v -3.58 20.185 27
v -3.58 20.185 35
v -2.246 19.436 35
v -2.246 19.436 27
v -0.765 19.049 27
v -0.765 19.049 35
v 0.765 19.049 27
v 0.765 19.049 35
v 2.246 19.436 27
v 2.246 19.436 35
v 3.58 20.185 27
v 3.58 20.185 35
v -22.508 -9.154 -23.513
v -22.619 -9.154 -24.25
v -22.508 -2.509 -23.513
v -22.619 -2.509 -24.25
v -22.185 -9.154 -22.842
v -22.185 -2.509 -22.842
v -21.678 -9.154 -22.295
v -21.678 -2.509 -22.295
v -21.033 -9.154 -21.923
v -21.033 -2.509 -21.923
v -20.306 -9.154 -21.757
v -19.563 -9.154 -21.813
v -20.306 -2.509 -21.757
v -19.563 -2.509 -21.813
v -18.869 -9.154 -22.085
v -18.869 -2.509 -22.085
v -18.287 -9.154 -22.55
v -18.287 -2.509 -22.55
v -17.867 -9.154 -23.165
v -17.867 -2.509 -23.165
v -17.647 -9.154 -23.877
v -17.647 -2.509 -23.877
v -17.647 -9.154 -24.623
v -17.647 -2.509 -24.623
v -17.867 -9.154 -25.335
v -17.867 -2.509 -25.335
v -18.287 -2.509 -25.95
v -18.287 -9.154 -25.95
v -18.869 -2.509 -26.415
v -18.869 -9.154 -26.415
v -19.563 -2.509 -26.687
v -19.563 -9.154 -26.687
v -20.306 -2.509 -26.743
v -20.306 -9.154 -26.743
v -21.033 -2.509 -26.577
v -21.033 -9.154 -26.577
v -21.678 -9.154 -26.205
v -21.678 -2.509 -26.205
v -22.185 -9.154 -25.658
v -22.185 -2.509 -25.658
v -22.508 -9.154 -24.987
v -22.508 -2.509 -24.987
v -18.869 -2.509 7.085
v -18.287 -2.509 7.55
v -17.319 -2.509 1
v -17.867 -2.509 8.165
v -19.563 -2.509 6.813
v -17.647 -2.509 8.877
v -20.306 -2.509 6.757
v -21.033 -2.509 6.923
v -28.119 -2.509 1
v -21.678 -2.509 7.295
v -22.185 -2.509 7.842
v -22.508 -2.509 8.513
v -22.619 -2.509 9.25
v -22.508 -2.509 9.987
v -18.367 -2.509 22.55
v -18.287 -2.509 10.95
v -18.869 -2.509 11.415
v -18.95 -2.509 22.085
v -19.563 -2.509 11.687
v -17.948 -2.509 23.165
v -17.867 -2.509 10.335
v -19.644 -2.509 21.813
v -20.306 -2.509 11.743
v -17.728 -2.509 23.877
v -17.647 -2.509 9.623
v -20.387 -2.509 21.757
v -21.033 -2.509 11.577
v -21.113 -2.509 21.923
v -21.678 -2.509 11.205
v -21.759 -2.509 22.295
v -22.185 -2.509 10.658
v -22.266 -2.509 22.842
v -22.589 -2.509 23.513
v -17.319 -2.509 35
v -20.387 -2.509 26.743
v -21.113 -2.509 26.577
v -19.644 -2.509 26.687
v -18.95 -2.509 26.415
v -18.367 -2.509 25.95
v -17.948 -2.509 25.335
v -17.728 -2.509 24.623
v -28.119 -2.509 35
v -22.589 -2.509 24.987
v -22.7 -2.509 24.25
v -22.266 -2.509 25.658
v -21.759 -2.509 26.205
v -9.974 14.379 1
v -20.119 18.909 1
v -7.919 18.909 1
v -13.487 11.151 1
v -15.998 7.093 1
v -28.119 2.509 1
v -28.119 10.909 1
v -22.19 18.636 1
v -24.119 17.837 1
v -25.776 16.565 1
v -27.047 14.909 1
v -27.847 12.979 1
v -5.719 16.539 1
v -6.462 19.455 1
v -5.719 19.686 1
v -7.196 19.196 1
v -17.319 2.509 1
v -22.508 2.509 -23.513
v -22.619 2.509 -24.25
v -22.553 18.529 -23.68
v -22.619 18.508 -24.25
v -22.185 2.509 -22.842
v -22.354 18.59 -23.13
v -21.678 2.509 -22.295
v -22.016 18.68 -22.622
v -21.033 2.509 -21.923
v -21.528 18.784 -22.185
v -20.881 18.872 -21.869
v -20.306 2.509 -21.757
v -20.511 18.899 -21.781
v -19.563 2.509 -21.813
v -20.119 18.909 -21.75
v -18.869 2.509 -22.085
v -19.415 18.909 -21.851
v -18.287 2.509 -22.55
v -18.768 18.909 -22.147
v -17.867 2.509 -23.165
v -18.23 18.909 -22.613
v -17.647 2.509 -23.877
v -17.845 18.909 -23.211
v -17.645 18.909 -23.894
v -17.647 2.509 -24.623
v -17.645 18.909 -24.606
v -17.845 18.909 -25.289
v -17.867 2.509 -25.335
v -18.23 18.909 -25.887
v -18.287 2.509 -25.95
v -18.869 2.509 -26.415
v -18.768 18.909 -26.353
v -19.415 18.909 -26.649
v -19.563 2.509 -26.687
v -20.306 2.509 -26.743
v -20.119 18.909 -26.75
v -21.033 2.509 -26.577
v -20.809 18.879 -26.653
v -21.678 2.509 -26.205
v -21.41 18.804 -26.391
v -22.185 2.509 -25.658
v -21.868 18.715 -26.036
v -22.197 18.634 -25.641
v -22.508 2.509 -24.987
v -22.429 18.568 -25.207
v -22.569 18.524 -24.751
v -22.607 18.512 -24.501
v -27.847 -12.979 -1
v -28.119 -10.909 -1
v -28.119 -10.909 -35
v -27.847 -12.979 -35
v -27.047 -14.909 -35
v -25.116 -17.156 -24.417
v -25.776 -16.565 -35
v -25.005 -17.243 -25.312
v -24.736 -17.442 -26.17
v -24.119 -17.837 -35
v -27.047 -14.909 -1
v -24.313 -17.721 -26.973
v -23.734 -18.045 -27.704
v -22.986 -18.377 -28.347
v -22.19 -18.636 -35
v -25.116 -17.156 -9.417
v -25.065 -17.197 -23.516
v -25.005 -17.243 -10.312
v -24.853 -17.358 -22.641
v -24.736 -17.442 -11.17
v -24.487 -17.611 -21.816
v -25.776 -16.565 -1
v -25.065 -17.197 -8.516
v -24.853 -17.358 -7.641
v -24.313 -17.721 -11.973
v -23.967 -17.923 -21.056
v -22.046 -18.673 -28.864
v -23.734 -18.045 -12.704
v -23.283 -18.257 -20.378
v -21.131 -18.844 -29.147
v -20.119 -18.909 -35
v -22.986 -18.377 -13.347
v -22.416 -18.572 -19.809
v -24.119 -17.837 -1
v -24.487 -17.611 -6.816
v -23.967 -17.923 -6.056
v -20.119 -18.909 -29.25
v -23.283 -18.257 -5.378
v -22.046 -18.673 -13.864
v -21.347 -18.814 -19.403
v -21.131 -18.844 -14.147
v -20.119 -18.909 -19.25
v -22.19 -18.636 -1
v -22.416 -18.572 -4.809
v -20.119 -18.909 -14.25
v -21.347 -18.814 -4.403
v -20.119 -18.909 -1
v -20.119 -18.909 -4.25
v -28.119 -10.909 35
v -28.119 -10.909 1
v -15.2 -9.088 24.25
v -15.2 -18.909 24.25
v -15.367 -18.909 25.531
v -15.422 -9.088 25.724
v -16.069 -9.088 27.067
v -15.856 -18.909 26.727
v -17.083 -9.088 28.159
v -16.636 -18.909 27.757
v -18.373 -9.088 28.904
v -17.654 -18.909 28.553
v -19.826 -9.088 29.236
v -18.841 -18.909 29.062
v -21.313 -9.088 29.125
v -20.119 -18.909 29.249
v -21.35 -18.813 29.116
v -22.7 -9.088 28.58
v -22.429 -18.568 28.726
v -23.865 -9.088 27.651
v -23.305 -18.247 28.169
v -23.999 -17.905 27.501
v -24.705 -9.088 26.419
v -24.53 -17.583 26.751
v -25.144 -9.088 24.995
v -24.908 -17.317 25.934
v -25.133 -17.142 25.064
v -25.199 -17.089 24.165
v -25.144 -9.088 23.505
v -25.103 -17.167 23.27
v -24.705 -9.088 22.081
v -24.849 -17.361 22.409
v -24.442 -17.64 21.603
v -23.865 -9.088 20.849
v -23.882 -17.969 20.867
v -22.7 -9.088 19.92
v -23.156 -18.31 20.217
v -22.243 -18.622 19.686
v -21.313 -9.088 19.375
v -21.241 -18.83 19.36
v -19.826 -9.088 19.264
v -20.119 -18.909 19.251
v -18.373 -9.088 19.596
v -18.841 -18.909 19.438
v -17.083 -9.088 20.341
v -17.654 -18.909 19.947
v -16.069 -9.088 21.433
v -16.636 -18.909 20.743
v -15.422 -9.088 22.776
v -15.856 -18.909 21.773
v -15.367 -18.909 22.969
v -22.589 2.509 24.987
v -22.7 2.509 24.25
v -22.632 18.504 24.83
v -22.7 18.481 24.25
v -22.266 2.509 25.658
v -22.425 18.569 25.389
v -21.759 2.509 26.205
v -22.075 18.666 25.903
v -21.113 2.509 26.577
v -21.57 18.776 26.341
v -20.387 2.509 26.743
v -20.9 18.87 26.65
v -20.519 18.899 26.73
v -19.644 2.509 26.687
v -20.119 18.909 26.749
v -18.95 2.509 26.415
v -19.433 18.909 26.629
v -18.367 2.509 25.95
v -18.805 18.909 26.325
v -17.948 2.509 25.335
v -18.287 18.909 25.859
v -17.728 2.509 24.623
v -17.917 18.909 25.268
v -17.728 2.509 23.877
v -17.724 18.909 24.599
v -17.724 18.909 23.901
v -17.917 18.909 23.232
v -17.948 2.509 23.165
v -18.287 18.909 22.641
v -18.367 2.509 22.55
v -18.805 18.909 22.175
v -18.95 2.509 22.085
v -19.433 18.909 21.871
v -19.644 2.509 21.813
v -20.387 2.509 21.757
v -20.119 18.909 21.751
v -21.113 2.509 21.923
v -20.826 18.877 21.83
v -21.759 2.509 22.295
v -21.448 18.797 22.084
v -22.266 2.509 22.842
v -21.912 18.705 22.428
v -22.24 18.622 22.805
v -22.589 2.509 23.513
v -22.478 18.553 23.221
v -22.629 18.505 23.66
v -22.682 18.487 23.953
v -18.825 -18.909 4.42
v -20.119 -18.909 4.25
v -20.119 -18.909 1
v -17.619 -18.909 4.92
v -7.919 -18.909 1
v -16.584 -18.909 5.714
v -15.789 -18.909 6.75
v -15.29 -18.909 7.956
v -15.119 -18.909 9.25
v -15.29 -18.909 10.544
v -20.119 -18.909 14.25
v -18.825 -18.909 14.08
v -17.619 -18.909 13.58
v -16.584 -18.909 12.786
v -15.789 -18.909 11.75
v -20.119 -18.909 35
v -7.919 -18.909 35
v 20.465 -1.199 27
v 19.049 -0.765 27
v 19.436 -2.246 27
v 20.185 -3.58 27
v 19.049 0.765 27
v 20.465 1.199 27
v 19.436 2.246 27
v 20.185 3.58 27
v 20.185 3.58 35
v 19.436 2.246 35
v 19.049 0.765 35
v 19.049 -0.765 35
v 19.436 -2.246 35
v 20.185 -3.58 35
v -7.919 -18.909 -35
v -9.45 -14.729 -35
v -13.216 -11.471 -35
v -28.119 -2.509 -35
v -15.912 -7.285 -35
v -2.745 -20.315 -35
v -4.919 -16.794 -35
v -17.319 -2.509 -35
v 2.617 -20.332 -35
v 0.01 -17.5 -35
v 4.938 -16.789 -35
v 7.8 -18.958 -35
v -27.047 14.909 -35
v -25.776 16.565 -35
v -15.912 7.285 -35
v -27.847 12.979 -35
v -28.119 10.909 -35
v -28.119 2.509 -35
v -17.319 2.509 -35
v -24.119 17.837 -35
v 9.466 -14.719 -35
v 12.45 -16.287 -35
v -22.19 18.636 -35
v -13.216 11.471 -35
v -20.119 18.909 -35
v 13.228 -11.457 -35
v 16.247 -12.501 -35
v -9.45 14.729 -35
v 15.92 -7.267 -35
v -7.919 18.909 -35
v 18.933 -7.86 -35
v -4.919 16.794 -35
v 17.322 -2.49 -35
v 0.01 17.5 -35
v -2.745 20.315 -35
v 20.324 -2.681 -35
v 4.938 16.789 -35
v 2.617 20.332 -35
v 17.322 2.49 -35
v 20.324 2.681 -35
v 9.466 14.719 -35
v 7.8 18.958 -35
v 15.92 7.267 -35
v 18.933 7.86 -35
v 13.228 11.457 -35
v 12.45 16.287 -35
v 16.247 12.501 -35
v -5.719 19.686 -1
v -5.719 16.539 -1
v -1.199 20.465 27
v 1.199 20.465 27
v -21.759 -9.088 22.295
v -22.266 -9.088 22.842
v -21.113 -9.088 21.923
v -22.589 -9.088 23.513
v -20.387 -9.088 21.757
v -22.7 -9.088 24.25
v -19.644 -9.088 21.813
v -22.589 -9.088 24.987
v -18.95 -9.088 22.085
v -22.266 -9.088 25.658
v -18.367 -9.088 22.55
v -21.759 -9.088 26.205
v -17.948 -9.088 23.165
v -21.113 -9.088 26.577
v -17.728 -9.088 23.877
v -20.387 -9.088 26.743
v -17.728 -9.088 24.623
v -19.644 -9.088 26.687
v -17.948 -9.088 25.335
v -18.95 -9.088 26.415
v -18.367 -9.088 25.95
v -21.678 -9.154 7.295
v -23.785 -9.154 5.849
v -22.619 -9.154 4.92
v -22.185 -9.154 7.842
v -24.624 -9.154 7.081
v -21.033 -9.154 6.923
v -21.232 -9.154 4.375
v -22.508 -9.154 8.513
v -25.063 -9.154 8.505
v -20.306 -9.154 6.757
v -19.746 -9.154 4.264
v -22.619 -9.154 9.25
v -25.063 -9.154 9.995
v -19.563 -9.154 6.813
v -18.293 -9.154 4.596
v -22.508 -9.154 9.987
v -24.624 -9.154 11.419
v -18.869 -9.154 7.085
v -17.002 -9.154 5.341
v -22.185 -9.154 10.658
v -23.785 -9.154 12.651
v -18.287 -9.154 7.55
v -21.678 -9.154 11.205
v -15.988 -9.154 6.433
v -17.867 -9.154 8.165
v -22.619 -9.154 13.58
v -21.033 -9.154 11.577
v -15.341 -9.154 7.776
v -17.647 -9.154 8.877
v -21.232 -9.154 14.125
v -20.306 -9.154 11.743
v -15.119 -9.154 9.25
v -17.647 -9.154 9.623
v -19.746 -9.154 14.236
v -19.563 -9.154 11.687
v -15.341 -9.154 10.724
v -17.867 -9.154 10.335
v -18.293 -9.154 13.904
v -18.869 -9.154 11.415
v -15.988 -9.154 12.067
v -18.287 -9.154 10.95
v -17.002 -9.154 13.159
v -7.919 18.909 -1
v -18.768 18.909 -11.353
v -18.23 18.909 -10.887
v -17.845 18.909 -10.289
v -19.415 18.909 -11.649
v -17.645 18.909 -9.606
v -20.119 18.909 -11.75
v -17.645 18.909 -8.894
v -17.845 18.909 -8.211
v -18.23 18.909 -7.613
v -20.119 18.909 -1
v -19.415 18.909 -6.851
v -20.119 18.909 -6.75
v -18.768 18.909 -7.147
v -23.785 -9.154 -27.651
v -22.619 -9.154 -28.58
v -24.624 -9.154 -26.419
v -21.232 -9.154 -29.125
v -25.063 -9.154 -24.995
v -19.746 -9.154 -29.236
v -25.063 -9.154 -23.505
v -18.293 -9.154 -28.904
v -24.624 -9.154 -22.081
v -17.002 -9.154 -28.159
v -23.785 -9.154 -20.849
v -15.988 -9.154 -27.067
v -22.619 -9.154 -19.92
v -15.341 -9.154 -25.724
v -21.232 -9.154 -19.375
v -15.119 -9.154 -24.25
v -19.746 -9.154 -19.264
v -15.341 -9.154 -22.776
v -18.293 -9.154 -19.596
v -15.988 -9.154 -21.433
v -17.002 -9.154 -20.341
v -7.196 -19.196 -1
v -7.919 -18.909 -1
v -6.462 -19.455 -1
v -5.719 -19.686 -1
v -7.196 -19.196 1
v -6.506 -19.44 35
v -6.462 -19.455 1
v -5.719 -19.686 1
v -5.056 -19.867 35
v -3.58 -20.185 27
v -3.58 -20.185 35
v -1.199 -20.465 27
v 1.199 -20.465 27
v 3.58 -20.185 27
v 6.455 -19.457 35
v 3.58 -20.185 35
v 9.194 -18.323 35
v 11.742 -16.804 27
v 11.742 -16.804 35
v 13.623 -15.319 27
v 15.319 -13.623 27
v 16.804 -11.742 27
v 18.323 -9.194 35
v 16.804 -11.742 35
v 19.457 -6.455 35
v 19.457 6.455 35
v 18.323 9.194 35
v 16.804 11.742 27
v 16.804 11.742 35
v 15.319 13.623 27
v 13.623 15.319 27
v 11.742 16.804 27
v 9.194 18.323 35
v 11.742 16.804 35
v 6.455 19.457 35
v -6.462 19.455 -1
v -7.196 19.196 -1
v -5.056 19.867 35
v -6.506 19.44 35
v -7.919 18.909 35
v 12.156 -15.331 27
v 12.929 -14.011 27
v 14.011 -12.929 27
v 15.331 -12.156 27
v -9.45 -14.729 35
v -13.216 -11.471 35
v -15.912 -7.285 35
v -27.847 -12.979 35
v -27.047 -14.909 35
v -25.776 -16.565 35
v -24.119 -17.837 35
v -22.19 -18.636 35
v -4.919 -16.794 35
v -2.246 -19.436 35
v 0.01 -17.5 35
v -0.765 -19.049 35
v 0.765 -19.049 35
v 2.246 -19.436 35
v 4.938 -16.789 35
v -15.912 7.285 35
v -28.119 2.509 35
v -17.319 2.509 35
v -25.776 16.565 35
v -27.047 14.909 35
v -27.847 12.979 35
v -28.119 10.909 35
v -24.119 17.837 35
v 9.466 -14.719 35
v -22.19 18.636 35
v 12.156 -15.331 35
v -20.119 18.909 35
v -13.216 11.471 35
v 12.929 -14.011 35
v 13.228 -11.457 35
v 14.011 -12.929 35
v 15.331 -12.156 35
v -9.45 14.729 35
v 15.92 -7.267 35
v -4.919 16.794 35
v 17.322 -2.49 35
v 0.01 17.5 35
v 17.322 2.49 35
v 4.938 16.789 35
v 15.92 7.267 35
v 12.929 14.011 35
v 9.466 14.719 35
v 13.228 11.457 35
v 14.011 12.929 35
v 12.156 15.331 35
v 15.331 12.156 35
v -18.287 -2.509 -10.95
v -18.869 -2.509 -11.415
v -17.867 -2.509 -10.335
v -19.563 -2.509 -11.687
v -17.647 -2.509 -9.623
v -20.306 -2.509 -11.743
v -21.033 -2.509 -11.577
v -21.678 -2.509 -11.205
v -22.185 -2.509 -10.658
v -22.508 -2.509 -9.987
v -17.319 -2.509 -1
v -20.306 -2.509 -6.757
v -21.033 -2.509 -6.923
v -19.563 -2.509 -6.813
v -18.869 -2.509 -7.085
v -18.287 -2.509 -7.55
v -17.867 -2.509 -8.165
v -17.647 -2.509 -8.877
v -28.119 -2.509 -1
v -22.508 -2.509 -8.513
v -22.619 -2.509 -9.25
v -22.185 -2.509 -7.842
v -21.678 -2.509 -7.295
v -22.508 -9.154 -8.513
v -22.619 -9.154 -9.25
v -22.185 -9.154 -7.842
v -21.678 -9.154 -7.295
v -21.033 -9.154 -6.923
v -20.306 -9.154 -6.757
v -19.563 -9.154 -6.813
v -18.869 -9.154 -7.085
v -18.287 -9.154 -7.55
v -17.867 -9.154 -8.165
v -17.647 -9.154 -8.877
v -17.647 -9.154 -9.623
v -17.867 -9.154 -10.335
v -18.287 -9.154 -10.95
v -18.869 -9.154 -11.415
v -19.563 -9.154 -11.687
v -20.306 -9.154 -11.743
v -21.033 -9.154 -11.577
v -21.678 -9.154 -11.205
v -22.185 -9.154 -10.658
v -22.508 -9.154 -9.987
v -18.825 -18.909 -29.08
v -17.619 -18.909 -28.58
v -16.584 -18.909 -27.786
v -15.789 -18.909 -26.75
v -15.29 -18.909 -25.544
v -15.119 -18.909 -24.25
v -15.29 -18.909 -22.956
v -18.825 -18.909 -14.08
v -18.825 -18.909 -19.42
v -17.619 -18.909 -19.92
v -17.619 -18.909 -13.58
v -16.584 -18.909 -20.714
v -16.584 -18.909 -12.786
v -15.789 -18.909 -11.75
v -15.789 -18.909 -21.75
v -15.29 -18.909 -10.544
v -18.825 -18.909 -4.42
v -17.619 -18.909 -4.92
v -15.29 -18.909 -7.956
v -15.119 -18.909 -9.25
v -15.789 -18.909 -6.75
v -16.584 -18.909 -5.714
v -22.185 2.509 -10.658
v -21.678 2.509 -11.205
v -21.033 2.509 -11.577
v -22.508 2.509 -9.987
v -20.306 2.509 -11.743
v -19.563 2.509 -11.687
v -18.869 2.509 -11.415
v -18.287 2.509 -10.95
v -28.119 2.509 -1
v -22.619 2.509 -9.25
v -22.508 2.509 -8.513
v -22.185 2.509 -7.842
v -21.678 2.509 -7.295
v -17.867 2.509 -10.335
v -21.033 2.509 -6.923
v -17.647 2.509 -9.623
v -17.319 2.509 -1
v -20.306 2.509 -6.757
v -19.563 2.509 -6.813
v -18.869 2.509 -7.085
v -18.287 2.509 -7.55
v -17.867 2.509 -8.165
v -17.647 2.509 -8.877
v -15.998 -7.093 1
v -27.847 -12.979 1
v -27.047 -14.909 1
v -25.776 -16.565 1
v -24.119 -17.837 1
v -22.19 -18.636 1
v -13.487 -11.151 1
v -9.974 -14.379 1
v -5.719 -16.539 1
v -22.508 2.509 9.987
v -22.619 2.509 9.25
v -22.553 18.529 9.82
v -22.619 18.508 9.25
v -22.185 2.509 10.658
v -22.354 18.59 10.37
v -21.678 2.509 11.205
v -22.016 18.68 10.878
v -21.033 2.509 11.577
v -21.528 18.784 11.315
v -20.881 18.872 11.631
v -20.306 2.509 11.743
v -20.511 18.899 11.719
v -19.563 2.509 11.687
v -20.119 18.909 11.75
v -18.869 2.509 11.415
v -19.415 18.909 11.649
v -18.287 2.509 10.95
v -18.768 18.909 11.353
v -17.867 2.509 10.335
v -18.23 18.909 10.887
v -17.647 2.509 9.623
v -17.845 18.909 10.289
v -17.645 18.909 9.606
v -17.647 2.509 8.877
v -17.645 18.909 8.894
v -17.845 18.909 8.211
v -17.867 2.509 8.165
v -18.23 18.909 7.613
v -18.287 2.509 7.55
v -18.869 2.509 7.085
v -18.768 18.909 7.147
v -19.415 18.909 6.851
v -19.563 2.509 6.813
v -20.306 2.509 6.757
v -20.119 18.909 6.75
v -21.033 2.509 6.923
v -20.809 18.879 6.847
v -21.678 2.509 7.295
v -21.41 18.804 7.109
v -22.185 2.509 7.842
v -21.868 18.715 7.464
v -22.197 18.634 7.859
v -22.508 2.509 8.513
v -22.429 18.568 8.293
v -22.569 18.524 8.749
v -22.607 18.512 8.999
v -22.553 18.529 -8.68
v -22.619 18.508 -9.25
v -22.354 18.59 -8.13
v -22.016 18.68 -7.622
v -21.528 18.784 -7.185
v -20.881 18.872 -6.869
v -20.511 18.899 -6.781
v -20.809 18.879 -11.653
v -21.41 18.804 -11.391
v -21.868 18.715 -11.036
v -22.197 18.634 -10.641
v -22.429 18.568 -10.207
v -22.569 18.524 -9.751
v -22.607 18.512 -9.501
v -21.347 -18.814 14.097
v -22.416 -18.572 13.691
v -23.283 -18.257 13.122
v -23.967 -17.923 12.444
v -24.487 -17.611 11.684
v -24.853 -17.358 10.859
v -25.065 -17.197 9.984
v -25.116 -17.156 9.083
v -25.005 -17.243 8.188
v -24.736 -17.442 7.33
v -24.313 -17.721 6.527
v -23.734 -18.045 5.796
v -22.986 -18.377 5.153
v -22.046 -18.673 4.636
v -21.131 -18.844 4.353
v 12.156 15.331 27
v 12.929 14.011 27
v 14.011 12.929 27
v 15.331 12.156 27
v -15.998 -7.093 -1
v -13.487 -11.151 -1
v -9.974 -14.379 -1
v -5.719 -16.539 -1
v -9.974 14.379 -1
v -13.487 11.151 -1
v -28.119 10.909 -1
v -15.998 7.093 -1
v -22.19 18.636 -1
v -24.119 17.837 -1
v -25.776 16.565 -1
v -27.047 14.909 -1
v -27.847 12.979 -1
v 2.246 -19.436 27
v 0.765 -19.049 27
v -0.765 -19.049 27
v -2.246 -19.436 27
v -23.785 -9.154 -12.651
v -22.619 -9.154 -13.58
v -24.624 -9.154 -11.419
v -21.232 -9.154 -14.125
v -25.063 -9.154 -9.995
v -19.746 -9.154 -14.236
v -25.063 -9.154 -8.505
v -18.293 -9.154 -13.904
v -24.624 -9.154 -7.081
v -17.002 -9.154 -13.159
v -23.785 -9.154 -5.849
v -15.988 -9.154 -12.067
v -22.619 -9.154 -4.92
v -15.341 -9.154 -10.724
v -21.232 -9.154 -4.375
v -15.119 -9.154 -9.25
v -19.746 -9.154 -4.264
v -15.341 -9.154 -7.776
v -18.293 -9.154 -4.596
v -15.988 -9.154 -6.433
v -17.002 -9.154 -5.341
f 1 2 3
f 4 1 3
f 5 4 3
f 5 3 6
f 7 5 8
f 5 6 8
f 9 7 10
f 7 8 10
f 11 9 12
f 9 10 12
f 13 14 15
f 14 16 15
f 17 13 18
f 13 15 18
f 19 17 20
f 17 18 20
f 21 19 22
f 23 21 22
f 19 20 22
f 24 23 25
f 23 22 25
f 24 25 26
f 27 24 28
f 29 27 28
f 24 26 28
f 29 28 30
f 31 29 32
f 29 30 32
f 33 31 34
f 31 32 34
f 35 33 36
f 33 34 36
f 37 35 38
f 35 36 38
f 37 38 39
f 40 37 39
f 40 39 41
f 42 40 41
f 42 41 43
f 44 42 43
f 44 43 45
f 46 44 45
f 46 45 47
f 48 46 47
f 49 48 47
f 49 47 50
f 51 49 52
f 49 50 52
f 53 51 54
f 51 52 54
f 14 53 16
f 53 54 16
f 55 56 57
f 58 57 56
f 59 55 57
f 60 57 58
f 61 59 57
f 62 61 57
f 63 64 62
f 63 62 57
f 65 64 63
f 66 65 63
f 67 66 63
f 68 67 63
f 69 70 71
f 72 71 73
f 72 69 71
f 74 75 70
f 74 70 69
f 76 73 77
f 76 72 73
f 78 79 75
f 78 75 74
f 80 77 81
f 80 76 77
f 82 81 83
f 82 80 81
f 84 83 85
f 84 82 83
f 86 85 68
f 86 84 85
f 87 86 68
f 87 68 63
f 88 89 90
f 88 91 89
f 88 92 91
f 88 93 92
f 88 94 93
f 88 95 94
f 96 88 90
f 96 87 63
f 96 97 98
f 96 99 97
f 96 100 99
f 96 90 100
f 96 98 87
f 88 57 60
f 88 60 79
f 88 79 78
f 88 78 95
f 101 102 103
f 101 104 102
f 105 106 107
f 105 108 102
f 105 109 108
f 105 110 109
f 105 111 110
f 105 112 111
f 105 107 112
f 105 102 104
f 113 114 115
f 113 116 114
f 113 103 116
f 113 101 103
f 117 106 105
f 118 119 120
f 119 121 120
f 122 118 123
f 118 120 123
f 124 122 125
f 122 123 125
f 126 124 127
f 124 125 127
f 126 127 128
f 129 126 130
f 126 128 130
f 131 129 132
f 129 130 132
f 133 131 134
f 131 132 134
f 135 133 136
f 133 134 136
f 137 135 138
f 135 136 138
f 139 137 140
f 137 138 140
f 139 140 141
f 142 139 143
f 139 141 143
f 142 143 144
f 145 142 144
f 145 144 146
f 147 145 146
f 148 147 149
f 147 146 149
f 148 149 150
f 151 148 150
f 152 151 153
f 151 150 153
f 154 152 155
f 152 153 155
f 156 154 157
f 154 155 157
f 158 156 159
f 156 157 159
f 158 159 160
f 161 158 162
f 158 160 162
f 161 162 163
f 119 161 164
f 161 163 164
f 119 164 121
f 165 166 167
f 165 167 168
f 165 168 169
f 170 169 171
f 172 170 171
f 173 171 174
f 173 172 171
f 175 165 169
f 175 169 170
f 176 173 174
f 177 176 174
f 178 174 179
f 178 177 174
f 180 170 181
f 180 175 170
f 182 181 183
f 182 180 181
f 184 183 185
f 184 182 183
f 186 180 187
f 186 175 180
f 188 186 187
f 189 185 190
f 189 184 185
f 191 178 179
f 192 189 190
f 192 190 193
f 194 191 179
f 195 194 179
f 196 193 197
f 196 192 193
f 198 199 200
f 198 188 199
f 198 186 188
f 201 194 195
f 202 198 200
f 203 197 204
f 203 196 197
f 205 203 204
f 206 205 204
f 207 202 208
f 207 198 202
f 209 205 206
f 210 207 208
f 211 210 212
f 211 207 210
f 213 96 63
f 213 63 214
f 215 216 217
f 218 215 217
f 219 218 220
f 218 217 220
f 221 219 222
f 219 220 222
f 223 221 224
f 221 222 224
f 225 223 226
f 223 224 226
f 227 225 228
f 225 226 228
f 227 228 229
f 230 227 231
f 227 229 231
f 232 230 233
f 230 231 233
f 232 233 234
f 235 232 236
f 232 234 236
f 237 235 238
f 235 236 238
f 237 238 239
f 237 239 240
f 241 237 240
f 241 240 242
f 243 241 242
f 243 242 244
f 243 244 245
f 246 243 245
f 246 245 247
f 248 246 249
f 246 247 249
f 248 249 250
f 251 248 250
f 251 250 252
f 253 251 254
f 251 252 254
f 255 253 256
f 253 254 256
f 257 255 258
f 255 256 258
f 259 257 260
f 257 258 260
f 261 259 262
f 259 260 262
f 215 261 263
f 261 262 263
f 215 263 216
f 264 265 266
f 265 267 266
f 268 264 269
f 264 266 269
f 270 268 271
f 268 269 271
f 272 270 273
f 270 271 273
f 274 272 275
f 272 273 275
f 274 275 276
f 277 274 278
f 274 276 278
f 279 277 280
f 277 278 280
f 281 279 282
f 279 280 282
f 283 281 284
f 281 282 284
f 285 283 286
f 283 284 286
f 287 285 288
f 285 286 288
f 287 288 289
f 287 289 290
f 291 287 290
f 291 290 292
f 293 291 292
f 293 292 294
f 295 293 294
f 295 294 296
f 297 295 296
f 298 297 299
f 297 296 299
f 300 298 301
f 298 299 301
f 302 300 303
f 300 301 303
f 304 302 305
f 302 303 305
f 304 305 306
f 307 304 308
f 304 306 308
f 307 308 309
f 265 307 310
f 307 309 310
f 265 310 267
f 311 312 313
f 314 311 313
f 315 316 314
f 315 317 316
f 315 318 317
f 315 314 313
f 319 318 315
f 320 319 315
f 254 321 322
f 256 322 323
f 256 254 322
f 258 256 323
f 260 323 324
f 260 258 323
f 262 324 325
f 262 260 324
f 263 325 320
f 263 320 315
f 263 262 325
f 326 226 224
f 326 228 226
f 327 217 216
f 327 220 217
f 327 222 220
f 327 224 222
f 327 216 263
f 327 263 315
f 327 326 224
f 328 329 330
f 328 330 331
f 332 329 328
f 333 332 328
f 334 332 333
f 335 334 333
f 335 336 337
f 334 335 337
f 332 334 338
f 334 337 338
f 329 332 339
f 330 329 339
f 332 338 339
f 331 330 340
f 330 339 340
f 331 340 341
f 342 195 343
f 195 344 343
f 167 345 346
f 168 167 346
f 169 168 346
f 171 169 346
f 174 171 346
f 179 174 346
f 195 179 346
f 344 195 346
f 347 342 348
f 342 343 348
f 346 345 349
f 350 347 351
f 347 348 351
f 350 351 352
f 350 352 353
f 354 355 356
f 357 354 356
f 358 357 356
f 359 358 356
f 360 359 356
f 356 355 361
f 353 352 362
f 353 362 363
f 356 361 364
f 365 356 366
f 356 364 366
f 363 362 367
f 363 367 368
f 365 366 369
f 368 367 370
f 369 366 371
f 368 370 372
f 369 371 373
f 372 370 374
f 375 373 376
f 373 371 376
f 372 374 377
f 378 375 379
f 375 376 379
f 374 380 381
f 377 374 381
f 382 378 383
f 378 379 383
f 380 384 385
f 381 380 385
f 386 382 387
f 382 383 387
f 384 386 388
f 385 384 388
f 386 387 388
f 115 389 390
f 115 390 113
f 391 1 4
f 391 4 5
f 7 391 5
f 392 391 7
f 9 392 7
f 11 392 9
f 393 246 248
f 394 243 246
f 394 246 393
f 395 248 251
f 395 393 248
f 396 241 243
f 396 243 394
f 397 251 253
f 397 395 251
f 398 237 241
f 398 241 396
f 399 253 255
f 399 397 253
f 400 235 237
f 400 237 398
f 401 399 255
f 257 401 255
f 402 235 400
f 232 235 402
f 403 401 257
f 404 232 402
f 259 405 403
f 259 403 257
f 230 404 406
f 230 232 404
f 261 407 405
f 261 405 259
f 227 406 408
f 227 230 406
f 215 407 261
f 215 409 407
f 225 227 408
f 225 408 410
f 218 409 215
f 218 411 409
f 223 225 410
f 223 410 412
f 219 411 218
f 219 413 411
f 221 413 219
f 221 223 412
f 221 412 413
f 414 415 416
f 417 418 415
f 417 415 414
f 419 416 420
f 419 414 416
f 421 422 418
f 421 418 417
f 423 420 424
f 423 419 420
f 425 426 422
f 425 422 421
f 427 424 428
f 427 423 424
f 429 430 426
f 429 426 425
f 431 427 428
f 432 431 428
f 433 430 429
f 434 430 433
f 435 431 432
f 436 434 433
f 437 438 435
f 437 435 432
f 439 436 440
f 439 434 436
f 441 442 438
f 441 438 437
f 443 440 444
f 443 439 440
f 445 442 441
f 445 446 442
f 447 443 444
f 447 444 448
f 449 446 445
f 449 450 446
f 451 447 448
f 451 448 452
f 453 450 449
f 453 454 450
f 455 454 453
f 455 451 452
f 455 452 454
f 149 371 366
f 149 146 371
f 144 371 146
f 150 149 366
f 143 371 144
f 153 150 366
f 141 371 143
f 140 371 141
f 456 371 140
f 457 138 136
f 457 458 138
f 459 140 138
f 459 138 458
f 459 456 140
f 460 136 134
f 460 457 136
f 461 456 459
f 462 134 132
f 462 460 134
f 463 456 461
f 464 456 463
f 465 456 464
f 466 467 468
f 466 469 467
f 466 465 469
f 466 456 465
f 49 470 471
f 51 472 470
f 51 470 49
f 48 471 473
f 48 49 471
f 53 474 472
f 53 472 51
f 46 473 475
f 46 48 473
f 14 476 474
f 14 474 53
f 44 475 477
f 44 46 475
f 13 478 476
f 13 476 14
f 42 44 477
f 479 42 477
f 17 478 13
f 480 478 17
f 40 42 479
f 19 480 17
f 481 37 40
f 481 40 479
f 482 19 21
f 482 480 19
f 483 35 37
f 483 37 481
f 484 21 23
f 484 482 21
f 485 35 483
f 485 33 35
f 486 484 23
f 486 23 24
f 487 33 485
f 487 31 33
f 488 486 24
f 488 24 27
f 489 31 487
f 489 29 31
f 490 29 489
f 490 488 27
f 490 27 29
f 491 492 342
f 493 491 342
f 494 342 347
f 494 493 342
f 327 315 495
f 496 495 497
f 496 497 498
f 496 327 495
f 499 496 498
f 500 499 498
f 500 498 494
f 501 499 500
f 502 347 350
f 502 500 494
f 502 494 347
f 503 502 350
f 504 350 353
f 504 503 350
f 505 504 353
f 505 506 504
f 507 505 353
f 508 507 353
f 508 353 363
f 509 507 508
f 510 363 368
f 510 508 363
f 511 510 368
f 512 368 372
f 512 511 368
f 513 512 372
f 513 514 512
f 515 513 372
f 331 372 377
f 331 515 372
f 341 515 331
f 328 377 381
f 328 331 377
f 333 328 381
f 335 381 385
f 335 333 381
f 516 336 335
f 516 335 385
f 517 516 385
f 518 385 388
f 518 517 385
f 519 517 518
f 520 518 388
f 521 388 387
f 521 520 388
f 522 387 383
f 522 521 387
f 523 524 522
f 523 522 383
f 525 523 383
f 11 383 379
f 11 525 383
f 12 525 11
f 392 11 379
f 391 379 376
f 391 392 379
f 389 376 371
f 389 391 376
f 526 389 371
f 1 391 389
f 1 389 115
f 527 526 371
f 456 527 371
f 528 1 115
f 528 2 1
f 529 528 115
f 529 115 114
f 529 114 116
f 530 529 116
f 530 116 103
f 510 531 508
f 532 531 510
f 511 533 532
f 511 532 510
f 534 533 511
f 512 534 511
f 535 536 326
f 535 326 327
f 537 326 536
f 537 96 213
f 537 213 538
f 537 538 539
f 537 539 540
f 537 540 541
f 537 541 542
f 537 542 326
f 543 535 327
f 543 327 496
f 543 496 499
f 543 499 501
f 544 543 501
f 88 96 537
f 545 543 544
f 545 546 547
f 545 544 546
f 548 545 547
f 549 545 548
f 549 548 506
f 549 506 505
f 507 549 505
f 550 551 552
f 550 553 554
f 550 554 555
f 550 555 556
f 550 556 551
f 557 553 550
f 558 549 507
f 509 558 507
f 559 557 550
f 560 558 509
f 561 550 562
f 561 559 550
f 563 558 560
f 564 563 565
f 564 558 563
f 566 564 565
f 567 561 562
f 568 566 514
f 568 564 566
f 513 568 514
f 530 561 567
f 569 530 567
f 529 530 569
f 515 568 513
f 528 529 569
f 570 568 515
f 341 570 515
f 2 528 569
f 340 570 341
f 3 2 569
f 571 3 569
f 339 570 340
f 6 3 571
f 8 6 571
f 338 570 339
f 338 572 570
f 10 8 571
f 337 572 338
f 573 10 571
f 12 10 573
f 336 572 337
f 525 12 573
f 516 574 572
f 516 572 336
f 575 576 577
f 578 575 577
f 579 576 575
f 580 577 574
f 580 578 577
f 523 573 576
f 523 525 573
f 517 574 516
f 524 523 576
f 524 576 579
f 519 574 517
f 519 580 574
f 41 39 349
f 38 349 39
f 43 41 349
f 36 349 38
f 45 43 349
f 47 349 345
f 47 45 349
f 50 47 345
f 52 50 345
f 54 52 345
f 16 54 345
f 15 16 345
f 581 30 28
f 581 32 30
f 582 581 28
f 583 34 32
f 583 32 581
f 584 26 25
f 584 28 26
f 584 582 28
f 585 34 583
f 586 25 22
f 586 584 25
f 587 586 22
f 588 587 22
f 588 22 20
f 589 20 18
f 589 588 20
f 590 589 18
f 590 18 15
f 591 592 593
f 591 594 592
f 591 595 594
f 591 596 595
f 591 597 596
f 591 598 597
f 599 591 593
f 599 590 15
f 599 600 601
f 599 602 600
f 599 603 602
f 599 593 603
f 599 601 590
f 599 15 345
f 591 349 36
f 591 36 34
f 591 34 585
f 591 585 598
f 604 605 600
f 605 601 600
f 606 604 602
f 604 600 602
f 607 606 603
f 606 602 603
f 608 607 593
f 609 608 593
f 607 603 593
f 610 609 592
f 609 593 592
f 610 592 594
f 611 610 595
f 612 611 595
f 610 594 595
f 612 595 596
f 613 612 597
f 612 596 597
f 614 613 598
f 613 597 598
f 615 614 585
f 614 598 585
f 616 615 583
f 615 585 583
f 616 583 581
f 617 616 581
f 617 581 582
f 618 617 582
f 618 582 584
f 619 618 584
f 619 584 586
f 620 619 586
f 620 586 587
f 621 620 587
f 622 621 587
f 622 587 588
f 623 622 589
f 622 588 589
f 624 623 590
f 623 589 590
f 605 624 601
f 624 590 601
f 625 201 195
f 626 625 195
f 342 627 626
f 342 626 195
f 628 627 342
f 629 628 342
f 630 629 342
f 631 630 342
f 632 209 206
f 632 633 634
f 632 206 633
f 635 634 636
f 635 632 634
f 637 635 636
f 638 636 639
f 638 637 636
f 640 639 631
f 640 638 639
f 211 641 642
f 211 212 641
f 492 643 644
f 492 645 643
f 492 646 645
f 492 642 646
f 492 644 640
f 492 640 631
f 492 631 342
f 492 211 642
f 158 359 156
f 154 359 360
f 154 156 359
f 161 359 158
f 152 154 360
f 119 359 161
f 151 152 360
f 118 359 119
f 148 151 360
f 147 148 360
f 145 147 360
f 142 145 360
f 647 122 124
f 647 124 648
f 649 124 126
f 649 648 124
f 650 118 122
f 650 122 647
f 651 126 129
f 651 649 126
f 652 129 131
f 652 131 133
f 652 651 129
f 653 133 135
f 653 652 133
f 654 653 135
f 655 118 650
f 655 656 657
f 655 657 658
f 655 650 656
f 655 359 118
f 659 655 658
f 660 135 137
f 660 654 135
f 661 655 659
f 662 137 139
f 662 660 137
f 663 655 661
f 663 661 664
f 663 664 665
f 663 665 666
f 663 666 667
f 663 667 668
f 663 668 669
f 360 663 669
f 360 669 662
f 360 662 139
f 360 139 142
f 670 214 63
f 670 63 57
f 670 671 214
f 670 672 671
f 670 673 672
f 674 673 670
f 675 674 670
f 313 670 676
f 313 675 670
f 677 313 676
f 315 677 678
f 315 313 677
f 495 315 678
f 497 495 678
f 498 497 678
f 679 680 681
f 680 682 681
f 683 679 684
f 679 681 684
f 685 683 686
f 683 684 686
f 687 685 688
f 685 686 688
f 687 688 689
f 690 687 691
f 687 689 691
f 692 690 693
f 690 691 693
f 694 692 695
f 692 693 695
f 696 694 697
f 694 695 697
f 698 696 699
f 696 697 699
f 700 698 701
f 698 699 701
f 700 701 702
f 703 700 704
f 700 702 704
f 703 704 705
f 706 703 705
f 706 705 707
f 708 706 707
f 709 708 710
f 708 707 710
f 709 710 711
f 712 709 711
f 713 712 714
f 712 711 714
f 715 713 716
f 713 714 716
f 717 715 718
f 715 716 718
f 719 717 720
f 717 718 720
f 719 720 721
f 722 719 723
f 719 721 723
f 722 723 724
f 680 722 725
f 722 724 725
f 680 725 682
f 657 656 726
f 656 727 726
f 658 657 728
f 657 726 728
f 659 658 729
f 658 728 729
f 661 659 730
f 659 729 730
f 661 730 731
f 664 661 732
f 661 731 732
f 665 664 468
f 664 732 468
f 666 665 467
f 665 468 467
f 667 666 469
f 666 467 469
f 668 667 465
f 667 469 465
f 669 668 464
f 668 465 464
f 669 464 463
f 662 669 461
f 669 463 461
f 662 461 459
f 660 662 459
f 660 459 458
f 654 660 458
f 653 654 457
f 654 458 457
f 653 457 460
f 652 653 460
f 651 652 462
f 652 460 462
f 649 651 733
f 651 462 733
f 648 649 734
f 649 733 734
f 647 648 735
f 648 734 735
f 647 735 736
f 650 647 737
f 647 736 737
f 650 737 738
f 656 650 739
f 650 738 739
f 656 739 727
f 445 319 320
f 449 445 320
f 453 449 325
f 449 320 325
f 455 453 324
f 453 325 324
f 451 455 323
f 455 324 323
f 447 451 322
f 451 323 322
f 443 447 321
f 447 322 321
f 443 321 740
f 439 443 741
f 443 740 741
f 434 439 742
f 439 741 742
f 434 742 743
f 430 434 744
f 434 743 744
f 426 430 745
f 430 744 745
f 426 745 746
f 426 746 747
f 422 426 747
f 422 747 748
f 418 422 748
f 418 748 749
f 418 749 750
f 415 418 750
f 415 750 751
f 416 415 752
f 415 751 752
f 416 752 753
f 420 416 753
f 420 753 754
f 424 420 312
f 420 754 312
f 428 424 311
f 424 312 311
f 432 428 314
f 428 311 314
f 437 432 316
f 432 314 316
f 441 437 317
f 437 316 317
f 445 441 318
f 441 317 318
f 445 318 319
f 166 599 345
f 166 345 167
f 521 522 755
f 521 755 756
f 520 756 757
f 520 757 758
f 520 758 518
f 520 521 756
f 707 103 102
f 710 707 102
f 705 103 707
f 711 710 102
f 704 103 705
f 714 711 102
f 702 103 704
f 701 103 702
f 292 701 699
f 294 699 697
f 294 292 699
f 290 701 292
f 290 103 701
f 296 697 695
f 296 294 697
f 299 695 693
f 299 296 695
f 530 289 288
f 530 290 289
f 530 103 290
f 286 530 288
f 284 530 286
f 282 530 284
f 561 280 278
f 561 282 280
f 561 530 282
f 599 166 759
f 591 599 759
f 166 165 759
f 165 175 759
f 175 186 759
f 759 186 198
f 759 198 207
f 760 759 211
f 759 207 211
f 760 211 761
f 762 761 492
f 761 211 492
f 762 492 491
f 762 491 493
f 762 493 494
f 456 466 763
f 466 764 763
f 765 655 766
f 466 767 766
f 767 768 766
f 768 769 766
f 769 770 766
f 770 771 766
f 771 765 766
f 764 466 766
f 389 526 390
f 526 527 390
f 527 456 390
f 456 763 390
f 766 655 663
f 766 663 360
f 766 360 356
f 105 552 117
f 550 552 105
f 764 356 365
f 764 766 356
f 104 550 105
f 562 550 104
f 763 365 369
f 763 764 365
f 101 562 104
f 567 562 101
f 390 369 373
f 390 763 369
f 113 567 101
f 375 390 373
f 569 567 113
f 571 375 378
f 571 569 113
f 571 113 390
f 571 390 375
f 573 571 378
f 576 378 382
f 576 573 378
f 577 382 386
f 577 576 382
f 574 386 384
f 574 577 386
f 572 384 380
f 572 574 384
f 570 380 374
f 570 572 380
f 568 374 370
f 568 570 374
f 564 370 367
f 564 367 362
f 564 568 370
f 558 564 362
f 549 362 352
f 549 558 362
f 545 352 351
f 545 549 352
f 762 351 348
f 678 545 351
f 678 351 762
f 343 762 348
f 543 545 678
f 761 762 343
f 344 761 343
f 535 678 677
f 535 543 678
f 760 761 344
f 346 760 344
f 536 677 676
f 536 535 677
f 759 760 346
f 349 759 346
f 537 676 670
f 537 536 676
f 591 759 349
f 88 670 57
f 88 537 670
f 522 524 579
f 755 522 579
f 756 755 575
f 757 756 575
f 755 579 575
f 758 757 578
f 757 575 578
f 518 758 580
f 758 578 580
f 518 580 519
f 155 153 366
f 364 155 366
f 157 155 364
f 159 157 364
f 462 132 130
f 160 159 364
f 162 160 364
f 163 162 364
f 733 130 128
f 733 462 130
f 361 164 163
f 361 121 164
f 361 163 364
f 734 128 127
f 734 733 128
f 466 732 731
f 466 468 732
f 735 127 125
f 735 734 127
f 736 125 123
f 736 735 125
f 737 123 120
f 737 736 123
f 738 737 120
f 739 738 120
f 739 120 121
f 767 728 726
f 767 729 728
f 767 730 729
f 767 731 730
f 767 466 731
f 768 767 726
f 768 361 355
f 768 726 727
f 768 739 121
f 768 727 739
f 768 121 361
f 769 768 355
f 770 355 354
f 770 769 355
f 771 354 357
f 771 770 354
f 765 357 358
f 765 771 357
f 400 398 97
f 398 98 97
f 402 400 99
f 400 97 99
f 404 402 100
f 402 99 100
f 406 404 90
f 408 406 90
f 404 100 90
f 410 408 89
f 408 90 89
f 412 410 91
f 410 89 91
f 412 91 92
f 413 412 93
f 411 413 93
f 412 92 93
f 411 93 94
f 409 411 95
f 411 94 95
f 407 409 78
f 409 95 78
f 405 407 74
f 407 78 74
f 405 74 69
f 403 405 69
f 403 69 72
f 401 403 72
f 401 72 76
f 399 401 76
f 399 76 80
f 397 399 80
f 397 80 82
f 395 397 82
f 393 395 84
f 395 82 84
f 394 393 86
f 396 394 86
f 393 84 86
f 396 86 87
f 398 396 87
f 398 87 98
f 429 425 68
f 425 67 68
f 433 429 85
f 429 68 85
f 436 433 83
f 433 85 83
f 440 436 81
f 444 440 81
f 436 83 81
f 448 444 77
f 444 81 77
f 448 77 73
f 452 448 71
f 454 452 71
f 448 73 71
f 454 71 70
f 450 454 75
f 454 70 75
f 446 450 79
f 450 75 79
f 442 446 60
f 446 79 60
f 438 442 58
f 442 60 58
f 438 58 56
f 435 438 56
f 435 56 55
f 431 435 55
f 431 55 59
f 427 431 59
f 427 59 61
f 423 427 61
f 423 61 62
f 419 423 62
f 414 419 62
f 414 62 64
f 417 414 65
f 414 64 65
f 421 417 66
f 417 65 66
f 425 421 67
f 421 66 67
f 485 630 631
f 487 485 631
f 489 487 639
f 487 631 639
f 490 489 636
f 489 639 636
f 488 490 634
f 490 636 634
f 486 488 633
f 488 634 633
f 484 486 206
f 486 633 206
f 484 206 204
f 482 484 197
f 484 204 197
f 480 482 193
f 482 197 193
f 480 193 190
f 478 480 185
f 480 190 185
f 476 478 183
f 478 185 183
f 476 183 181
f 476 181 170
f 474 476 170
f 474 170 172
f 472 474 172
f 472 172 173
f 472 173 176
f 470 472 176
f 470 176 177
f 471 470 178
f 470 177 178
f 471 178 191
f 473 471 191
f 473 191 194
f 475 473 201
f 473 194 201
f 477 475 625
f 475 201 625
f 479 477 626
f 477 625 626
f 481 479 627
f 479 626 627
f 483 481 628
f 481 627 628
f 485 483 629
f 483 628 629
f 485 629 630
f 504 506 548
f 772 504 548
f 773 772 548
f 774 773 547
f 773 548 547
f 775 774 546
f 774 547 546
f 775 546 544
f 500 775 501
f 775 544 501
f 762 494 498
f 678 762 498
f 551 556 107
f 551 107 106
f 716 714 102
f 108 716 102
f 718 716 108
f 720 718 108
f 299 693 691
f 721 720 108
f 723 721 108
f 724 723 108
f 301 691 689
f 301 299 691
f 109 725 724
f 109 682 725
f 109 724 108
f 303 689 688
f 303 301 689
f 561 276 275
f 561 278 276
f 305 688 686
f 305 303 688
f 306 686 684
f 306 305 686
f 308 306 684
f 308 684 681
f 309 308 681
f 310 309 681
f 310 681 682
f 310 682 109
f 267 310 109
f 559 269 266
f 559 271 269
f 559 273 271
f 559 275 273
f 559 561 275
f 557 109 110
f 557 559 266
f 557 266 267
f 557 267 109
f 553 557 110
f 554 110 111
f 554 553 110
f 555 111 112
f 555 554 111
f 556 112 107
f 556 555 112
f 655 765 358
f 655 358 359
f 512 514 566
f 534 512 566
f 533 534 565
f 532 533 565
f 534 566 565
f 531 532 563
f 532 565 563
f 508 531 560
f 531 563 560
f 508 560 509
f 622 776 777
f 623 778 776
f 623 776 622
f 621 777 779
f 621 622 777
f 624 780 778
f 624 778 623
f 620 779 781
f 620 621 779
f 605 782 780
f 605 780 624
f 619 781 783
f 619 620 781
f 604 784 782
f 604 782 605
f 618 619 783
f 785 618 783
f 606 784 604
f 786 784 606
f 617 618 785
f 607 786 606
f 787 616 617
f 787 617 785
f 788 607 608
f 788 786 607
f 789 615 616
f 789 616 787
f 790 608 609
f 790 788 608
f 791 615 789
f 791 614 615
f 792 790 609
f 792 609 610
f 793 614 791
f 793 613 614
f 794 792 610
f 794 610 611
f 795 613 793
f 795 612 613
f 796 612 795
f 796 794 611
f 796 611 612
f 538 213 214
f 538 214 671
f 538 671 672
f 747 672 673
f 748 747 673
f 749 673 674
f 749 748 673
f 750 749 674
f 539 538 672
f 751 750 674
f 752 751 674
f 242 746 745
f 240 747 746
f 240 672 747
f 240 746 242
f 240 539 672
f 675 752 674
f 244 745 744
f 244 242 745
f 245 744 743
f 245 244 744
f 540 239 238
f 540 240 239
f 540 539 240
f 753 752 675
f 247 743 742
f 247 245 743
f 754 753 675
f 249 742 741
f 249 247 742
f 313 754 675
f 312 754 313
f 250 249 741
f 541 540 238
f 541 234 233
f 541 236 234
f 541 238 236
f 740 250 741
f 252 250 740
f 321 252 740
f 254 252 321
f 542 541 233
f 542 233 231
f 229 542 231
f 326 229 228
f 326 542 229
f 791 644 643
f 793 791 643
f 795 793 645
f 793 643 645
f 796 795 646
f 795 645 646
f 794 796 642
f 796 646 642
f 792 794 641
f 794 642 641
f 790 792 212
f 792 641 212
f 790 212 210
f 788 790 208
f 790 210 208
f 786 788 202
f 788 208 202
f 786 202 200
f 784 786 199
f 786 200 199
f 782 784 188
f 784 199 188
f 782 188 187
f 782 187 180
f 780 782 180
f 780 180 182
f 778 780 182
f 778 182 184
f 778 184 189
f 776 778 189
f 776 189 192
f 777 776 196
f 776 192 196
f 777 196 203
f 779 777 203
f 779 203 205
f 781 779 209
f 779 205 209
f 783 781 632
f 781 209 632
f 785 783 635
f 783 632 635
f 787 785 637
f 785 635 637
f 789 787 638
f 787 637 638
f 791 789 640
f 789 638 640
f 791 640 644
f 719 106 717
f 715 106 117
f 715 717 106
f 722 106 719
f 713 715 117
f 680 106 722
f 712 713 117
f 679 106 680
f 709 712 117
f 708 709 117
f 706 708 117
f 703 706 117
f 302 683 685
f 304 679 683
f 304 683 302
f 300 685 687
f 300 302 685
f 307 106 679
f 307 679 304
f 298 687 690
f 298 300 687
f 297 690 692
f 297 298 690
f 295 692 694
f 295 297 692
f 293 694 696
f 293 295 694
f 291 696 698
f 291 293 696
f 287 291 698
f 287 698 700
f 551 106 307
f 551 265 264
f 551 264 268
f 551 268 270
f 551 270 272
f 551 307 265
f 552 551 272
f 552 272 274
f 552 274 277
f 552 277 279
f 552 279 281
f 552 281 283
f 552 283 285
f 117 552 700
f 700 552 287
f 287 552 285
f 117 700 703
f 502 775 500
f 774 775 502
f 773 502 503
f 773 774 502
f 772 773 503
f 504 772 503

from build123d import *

# Parameters (mm, degrees)
F1_DEPTH       = 35
F3_D           = 5
F3_START       = 1.7550021
F3_START_2     = 1.8205079
F3_CBORE_D     = 10
F3_CBORE_DEPTH = 8
F4_W           = 22.4
F4_H           = 2
F5_DEPTH       = 25
F6_R           = 6
F7_DEPTH       = 8


with BuildPart() as f1:
    # F0 (on Top) → F1 (new body, symmetric)
    with BuildSketch(Plane.XY):
        with BuildLine():
            ThreePointArc((-17.3192642082, 2.5086026559), (17.5, 0), (-17.3192642082, -2.5086026559))
            Line((-17.3192642082, -2.5086026559), (-28.1192642082, -2.5086026559))
            Line((-28.1192642082, -2.5086026559), (-28.1192642082, -10.9086026559))
            ThreePointArc((-28.1192642082, -10.9086026559), (-25.7761184577, -16.5654569054), (-20.1192642082, -18.9086026559))
            Line((-20.1192642082, -18.9086026559), (-7.9192642082, -18.9086026559))
            ThreePointArc((-7.9192642082, -18.9086026559), (20.5, 0), (-7.9192642082, 18.9086026559))
            Line((-7.9192642082, 18.9086026559), (-20.1192642082, 18.9086026559))
            ThreePointArc((-20.1192642082, 18.9086026559), (-25.7761184577, 16.5654569054), (-28.1192642082, 10.9086026559))
            Line((-28.1192642082, 10.9086026559), (-28.1192642082, 2.5086026559))
            Line((-28.1192642082, 2.5086026559), (-17.3192642082, 2.5086026559))
        make_face()
    extrude(amount=F1_DEPTH, both=True)

    # F3 (through all)
    # its depths count from where the whole tool has entered the part; down to there all is cleared
    with Locations(Plane.XZ.offset(18.9086026559)):
        with Locations((-20.1192642082, -24.25, -F3_START), (-20.1192642082, -9.25, -F3_START), (-20.1192642082, 9.25, -F3_START), (-20.2, 24.25, -F3_START_2)):
            CounterBoreHole(F3_D / 2, F3_CBORE_D / 2, F3_CBORE_DEPTH)

    # F4 (on Front) → F5 (cut, symmetric)
    with BuildSketch(Plane.XZ):
        with Locations((-16.9192642082, 0)):
            Rectangle(F4_W, F4_H)
    extrude(amount=F5_DEPTH, both=True, mode=Mode.SUBTRACT)

    # F6 (on face) → F7 (cut)
    with BuildSketch(Plane.XY.offset(35)):
        with Locations((0, -25)):
            Circle(F6_R)
        with Locations((17.6776695297, -17.6776695297)):
            Circle(F6_R)
        with Locations((25, 0)):
            Circle(F6_R)
        with Locations((17.6776695297, 17.6776695297)):
            Circle(F6_R)
        with Locations((0, 25)):
            Circle(F6_R)
    extrude(amount=-F7_DEPTH, mode=Mode.SUBTRACT)


solid = f1.part
